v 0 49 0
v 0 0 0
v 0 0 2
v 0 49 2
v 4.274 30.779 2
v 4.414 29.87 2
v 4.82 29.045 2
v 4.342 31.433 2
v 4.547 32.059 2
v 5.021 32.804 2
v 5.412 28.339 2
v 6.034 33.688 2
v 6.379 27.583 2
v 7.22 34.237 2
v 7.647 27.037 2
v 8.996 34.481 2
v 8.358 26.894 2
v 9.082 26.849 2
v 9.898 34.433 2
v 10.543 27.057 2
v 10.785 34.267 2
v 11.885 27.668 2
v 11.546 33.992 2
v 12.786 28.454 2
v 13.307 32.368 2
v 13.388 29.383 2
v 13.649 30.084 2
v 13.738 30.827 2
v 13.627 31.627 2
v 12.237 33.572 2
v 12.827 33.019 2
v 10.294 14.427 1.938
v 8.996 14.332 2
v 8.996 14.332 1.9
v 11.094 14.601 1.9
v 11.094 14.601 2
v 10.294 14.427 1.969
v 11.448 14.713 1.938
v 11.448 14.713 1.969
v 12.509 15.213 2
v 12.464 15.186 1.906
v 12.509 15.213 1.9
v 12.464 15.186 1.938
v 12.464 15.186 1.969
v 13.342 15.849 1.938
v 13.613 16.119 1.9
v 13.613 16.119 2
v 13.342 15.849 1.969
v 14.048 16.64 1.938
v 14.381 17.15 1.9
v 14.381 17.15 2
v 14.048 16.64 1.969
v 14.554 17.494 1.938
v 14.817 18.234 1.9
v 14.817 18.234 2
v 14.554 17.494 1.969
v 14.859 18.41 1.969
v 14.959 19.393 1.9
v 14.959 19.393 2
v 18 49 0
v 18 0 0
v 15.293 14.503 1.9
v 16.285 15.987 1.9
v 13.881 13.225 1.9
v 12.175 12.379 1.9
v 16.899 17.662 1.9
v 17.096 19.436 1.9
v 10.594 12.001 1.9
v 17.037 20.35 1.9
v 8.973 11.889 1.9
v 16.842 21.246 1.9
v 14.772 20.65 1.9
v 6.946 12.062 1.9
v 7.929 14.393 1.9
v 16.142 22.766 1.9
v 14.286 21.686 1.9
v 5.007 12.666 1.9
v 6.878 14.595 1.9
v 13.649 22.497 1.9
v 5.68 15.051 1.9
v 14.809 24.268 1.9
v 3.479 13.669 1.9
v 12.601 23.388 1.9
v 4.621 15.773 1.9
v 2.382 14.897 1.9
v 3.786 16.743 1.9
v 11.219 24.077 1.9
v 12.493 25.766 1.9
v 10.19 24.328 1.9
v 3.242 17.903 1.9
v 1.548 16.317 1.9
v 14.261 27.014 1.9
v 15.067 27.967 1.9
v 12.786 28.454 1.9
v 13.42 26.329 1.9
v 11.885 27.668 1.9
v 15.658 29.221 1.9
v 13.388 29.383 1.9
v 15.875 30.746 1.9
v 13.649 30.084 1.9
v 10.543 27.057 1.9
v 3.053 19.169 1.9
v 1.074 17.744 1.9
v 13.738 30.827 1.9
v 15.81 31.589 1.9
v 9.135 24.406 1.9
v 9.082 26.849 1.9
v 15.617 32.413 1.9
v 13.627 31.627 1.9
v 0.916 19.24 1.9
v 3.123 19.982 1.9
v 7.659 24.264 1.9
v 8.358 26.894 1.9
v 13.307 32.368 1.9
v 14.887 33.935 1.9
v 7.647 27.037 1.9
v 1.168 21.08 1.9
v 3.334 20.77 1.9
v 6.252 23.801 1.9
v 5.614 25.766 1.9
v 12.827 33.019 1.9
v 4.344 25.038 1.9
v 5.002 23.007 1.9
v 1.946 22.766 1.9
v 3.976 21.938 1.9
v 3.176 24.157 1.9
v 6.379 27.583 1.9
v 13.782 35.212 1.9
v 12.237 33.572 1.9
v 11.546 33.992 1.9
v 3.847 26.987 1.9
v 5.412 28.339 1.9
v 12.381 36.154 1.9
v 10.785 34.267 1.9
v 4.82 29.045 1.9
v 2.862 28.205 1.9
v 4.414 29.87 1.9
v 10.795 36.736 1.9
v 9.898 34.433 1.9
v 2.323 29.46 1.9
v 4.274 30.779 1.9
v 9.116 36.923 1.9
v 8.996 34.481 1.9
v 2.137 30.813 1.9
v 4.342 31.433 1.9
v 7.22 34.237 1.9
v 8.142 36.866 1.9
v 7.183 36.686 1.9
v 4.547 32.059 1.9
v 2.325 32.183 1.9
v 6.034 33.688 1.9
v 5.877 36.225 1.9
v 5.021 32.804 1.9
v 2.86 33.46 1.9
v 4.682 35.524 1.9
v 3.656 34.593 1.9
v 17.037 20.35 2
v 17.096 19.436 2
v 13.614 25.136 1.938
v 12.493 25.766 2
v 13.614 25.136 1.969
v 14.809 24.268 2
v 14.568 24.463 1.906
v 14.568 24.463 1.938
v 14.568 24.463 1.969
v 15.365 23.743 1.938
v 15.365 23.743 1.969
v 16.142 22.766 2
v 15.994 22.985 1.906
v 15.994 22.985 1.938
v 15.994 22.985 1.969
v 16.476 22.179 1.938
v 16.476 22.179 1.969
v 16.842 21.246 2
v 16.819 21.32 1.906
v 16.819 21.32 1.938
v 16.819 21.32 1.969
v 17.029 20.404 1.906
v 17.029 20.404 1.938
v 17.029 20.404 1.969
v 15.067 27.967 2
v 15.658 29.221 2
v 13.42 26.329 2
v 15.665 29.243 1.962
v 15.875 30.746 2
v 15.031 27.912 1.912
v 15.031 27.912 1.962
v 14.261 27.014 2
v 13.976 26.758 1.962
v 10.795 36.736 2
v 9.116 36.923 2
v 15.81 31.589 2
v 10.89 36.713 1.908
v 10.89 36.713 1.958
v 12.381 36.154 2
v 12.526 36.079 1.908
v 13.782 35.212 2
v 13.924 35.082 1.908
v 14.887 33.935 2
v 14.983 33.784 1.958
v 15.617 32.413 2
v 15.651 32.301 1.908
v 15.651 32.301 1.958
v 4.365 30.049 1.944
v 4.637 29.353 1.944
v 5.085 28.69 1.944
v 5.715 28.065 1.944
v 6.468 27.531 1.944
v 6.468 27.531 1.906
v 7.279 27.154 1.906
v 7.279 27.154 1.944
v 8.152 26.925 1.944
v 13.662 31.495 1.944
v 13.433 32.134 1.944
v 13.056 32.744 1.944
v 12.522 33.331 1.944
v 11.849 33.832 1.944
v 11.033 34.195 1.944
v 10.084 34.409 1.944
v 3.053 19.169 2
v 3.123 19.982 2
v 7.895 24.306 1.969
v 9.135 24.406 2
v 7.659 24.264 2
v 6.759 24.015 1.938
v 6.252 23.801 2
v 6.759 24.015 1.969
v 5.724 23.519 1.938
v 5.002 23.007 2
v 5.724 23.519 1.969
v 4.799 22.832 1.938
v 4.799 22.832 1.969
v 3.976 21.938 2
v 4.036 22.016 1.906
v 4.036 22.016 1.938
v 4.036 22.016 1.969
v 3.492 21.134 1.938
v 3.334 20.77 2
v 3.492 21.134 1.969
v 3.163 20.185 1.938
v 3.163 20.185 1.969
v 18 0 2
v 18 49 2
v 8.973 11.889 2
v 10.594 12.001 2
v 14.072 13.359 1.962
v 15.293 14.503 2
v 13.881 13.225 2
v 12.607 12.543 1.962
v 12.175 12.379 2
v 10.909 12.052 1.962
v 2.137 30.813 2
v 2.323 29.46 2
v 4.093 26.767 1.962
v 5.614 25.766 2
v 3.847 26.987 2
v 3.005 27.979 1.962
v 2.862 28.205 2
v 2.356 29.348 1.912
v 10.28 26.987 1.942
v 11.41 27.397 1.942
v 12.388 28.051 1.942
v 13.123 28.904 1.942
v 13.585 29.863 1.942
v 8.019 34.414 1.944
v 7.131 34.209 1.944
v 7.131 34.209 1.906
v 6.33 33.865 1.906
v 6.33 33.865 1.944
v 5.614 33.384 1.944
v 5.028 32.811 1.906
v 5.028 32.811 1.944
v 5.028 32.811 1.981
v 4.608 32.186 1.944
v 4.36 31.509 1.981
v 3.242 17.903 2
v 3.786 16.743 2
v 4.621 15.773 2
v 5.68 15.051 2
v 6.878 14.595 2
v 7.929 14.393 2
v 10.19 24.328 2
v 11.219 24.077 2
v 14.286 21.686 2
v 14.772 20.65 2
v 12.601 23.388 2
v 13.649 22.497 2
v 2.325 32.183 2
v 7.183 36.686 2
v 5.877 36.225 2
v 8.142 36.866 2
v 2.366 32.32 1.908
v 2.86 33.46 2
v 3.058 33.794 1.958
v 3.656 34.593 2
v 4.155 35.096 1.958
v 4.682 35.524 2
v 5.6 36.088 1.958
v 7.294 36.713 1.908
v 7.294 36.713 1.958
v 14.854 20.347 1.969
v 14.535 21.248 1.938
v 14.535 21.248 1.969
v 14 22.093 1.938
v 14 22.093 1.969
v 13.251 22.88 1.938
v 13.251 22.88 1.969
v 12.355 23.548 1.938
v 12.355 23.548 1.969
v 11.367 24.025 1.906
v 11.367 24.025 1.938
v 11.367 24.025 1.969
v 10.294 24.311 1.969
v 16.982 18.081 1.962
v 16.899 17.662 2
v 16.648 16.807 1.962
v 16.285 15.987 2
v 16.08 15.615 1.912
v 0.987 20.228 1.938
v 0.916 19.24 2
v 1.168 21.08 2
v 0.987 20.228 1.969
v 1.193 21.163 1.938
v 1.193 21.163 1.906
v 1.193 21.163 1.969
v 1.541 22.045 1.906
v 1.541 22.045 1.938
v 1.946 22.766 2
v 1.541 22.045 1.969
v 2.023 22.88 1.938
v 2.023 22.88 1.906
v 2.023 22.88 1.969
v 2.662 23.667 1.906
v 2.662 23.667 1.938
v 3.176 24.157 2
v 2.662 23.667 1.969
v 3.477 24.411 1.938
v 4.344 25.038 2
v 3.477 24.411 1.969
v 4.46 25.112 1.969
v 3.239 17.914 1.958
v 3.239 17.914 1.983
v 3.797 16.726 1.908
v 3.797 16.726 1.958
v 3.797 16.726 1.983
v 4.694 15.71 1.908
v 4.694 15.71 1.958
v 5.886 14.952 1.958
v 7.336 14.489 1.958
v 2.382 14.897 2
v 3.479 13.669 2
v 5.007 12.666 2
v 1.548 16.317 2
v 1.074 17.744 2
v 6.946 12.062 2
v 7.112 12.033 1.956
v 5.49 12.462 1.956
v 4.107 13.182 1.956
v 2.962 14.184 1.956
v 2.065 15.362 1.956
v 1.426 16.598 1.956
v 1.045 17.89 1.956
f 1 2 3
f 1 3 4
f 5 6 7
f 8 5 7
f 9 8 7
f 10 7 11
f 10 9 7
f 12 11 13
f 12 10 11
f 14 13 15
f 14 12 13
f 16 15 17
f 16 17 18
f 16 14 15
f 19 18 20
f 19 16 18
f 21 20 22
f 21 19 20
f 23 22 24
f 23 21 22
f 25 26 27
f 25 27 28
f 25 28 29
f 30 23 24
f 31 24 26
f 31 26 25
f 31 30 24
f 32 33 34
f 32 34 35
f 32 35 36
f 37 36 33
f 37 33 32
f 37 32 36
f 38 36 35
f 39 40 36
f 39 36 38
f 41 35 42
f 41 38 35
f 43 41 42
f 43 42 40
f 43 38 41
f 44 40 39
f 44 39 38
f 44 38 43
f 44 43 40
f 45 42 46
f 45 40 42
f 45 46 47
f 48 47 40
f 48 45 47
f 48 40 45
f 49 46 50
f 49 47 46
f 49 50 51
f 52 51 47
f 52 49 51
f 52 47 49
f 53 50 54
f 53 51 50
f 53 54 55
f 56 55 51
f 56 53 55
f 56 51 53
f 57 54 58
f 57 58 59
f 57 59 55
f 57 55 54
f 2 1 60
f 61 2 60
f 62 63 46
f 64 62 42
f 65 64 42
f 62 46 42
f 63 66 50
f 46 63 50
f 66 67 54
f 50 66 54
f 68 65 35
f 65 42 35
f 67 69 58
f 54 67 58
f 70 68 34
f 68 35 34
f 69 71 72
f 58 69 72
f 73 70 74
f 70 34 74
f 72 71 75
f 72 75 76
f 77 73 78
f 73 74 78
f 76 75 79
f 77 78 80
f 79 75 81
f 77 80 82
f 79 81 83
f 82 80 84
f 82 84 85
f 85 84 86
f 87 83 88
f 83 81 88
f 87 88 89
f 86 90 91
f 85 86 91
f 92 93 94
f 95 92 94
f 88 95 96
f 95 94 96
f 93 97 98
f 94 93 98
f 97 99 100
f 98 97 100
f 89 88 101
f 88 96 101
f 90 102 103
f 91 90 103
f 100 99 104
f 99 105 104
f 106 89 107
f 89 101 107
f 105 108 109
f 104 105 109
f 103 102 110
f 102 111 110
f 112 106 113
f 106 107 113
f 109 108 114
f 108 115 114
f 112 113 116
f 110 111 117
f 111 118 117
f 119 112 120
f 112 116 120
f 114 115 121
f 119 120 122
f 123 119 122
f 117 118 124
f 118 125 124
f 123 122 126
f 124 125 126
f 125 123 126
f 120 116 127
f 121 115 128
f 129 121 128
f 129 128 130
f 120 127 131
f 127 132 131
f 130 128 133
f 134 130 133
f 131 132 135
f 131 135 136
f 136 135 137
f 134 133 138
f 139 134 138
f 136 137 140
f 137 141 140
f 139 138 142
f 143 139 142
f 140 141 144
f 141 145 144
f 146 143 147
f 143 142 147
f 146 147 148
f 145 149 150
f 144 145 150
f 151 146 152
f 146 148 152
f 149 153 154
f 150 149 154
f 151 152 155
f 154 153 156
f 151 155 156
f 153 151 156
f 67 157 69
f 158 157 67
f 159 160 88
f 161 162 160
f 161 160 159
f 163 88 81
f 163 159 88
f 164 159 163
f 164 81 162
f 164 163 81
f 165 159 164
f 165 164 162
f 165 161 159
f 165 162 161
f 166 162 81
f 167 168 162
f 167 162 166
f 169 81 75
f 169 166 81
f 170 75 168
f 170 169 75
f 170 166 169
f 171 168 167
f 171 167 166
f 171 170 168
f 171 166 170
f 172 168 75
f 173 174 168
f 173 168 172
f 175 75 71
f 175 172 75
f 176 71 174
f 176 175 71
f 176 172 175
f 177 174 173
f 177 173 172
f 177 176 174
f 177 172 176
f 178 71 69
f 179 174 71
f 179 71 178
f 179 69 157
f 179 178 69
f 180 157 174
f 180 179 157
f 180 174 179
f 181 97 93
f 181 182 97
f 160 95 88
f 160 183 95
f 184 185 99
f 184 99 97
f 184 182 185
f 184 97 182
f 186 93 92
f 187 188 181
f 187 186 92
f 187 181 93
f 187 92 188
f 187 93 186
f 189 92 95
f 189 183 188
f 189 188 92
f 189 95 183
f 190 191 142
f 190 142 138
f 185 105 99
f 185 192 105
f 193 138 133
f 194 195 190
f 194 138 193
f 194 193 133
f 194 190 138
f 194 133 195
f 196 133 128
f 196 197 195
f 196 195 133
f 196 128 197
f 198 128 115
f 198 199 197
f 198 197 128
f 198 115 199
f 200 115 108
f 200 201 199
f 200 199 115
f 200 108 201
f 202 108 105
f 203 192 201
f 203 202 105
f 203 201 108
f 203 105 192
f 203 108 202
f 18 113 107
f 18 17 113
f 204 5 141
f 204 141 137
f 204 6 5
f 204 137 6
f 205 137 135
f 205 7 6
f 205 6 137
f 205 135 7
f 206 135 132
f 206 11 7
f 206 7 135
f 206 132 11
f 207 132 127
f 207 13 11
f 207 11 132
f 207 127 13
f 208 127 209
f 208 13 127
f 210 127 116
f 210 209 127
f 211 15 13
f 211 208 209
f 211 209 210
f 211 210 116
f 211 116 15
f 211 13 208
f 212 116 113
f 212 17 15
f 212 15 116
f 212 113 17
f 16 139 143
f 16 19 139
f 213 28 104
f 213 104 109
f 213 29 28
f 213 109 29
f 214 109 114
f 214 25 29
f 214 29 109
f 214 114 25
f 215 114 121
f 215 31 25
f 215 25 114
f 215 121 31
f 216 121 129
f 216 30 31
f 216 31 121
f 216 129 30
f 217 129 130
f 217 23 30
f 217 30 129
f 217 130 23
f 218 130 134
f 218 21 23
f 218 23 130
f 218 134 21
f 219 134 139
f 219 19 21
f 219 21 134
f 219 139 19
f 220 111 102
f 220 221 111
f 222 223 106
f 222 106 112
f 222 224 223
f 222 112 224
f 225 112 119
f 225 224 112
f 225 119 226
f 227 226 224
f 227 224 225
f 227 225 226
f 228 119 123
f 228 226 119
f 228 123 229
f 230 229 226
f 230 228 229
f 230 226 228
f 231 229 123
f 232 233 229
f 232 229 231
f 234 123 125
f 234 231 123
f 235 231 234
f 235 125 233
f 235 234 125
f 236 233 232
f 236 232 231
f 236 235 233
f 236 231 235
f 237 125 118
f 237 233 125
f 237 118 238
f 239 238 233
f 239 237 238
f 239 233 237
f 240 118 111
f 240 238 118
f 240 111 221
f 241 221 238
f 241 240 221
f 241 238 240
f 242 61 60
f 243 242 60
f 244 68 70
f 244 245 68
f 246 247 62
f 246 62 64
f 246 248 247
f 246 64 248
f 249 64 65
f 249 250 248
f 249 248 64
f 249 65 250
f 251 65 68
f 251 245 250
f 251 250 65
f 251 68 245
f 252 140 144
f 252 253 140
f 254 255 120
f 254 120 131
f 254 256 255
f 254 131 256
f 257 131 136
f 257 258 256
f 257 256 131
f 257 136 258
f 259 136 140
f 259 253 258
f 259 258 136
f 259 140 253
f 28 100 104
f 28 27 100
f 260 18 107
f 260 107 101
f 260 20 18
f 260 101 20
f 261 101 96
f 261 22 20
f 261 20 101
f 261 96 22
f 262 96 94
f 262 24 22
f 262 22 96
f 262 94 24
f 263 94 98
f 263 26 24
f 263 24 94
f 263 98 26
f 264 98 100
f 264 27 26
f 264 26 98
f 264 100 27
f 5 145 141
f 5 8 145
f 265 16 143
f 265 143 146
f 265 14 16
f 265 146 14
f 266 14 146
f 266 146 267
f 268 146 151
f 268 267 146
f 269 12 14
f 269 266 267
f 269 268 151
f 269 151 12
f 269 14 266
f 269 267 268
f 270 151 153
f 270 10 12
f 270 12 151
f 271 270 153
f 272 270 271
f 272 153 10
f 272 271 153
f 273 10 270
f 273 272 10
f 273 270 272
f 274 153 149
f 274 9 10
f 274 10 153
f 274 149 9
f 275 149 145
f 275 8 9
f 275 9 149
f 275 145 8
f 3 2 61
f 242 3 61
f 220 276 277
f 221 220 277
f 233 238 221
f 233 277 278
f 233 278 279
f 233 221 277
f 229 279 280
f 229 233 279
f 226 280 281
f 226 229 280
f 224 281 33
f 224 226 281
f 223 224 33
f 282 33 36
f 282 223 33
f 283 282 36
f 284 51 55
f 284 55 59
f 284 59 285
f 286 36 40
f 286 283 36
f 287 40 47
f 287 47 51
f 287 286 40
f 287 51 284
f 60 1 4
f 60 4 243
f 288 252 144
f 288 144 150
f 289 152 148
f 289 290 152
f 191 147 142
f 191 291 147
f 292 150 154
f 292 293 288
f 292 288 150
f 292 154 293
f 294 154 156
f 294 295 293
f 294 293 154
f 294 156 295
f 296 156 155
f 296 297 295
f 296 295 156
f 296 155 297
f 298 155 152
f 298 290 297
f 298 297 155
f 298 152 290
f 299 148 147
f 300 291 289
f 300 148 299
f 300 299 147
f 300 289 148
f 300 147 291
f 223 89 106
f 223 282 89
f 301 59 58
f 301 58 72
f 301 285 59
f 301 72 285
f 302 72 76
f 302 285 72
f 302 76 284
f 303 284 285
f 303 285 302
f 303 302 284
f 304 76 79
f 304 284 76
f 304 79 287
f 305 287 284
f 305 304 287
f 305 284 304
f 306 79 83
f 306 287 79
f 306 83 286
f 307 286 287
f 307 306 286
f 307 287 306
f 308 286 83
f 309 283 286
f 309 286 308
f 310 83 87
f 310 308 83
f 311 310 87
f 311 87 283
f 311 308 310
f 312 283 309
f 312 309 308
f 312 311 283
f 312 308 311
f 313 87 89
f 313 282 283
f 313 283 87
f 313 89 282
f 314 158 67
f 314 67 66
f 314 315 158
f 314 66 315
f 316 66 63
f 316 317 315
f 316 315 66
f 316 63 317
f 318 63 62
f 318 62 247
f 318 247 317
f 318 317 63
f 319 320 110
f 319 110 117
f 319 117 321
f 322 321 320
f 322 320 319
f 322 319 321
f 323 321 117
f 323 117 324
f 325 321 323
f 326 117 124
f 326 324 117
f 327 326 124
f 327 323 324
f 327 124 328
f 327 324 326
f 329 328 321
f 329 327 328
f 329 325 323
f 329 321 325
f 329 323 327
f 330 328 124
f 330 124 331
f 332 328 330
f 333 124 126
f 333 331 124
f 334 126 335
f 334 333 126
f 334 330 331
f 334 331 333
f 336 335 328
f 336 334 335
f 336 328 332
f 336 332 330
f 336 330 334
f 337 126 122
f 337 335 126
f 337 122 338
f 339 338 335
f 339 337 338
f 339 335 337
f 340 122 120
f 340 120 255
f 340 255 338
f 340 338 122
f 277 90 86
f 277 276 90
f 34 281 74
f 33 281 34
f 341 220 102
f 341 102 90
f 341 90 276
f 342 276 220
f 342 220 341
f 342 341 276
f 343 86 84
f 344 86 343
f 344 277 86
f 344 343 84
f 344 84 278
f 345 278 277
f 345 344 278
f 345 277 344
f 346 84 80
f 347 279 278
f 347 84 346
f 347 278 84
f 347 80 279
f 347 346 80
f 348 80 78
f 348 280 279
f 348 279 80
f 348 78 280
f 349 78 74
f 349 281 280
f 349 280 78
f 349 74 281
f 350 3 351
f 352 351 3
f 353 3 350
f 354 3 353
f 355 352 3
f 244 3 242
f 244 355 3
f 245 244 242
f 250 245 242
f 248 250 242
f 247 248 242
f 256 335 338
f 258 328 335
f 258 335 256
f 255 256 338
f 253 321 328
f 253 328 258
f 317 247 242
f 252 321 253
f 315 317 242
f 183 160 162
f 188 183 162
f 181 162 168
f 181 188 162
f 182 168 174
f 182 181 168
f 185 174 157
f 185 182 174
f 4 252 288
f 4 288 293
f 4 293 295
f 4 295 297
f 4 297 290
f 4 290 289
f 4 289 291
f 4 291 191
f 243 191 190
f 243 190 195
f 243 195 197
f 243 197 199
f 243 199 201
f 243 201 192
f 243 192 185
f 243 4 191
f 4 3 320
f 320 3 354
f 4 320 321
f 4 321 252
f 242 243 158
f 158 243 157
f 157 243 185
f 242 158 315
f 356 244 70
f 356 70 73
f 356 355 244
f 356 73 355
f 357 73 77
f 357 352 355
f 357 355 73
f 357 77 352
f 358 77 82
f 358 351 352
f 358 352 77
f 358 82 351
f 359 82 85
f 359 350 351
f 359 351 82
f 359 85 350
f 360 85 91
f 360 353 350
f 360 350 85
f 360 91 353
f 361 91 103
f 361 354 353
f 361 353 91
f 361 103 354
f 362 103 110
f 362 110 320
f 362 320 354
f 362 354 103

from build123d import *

# Parameters (mm, degrees)
SKETCH_1_W          = 18
SKETCH_1_H          = 49
EXTRUDE_1_DEPTH     = 2
CUT_EXTRUDE_1_DEPTH = 0.1


with BuildPart() as part:
    # ｽｹｯﾁ1 → ﾎﾞｽ - 押し出し1 (new body)
    with BuildSketch(Plane.XY):
        with Locations((9, 24.5)):
            Rectangle(SKETCH_1_W, SKETCH_1_H)
    extrude(amount=EXTRUDE_1_DEPTH)

    # ｽｹｯﾁ2 → ｶｯﾄ - 押し出し1 (cut)
    with BuildSketch(Plane.XY.offset(2)):
        with BuildLine():
            add(Edge.make_bspline(
                [(12.492976262, 25.76573768), (12.687888699, 25.66410623), (13.068033045, 25.46589096), (13.609442265, 25.146729793), (14.104232006, 24.810354657), (14.566130292, 24.472653542), (14.987022018, 24.120693557), (15.36220097, 23.753075119), (15.700934598, 23.378974313), (15.996391825, 22.992056293), (16.256266732, 22.593348984), (16.480867152, 22.181805894), (16.672844907, 21.758328927), (16.824992758, 21.318295495), (16.950326734, 20.868169429), (17.036566118, 20.402138517), (17.082945505, 19.923273626), (17.09171404, 19.599639288), (17.096153846, 19.435772236)],
                knots=[0, 0, 0, 0, 1.272397273, 2.481599622, 3.635517121, 4.734568067, 5.792894095, 6.808321871, 7.773003508, 8.711915296, 9.623354172, 10.525449501, 11.423591555, 12.311487226, 13.218079475, 14.126165749, 15.051214107, 16, 16, 16, 16], degree=3))
            add(Edge.make_bspline(
                [(17.096153846, 19.435772236), (17.090905431, 19.206507305), (17.080516849, 18.752705983), (16.990029458, 18.082920831), (16.854550087, 17.432419243), (16.656705548, 16.801343833), (16.400119799, 16.193176846), (16.083911326, 15.607397691), (15.725967234, 15.034405605), (15.438501106, 14.681848605), (15.29304387, 14.503455529)],
                knots=[0, 0, 0, 0, 1.025265484, 2.029385089, 3.018602448, 3.995076438, 4.983346944, 5.966715145, 6.97116228, 8, 8, 8, 8], degree=3))
            add(Edge.make_bspline(
                [(15.29304387, 14.503455529), (15.103656429, 14.295308601), (14.72722186, 13.881586874), (14.082359441, 13.344439399), (13.374639125, 12.893026557), (12.606799397, 12.52514456), (11.780892761, 12.238810413), (10.897095194, 12.033053282), (9.953683725, 11.915198898), (9.305266145, 11.898162825), (8.97261869, 11.889423077)],
                knots=[0, 0, 0, 0, 0.954267603, 1.896743057, 2.838368354, 3.796610408, 4.779680527, 5.799409237, 6.871065594, 8, 8, 8, 8], degree=3))
            add(Edge.make_bspline(
                [(8.97261869, 11.889423077), (8.652759742, 11.897264043), (8.030346719, 11.912521767), (7.124397588, 12.015898167), (6.279917417, 12.19706276), (5.491996025, 12.445016263), (4.765383486, 12.767575138), (4.102150245, 13.169043061), (3.492727326, 13.633260552), (2.955609354, 14.173559905), (2.47875762, 14.752257215), (2.059874973, 15.34928156), (1.711708475, 15.964687439), (1.416929487, 16.589298616), (1.191268475, 17.231869772), (1.034975402, 17.889094861), (0.935715961, 18.559825922), (0.922509311, 19.012478778), (0.915865385, 19.240196815)],
                knots=[0, 0, 0, 0, 1.256902934, 2.445805442, 3.576955095, 4.645999104, 5.686449165, 6.692658513, 7.68621702, 8.689161843, 9.678783111, 10.630372946, 11.551080876, 12.453998257, 13.34127905, 14.221779781, 15.105423033, 16, 16, 16, 16], degree=3))
            add(Edge.make_bspline(
                [(0.915865385, 19.240196815), (0.919797039, 19.407287032), (0.927567377, 19.737516278), (0.981348577, 20.225395815), (1.067811501, 20.700258803), (1.185237448, 21.16385922), (1.344379967, 21.612821949), (1.536527338, 22.049274279), (1.760582229, 22.473708952), (2.019670155, 22.888447054), (2.32108214, 23.287677306), (2.662374114, 23.678175055), (3.050367292, 24.053880973), (3.480745293, 24.419385328), (3.948589749, 24.781171864), (4.46605259, 25.119688518), (5.019416091, 25.458900743), (5.412699297, 25.661703814), (5.614445613, 25.76573768)],
                knots=[0, 0, 0, 0, 0.941657376, 1.861047343, 2.762797495, 3.66048619, 4.553285746, 5.444104102, 6.34607688, 7.256116206, 8.197091036, 9.162375105, 10.176350973, 11.237807142, 12.343728897, 13.50695164, 14.721116704, 16, 16, 16, 16], degree=3))
            add(Edge.make_bspline(
                [(5.614445613, 25.76573768), (5.338279296, 25.91633316), (4.803544008, 26.207928159), (4.095500131, 26.743687679), (3.48732464, 27.323949419), (2.995734507, 27.960966416), (2.608800241, 28.6348389), (2.343334378, 29.341350689), (2.163744014, 30.06740139), (2.145953851, 30.563423906), (2.137019231, 30.81253756)],
                knots=[0, 0, 0, 0, 1.166880483, 2.259407225, 3.286803203, 4.280235371, 5.237608625, 6.161067461, 7.076446754, 8, 8, 8, 8], degree=3))
            add(Edge.make_bspline(
                [(2.137019231, 30.81253756), (2.148145955, 31.066294163), (2.170512612, 31.576389188), (2.351374133, 32.33570942), (2.6461053, 33.08149355), (3.046978512, 33.810126882), (3.546273679, 34.496948878), (4.145304642, 35.112950673), (4.829766358, 35.652552009), (5.596242203, 36.105507756), (6.421081593, 36.474150149), (7.291365357, 36.728456918), (8.191930248, 36.894709784), (8.804916517, 36.913532916), (9.115722656, 36.923076923)],
                knots=[0, 0, 0, 0, 0.888701115, 1.786444228, 2.72001202, 3.692817113, 4.693886446, 5.687152267, 6.695133018, 7.739871481, 8.800368666, 9.853104506, 10.91144658, 12, 12, 12, 12], degree=3))
            add(Edge.make_bspline(
                [(9.115722656, 36.923076923), (9.41850754, 36.913236624), (10.015564838, 36.893832676), (10.893189, 36.731996953), (11.73291897, 36.461694327), (12.531858954, 36.095000718), (13.275706124, 35.643332425), (13.932946835, 35.096319335), (14.513513151, 34.483034856), (14.993739119, 33.796421126), (15.389454492, 33.070587595), (15.665005266, 32.311155801), (15.841571374, 31.534534525), (15.863841941, 31.009040249), (15.875, 30.745755709)],
                knots=[0, 0, 0, 0, 1.072916533, 2.115669174, 3.151510826, 4.193348718, 5.225979165, 6.227137561, 7.216255879, 8.211077061, 9.189680878, 10.138522389, 11.067357538, 12, 12, 12, 12], degree=3))
            add(Edge.make_bspline(
                [(15.875, 30.745755709), (15.865239864, 30.487378764), (15.846071512, 29.979941129), (15.684827281, 29.240212481), (15.413274201, 28.547458966), (15.042519271, 27.893819773), (14.559292293, 27.291149227), (13.970043592, 26.731783602), (13.279471034, 26.211127859), (12.760624648, 25.917306345), (12.492976262, 25.76573768)],
                knots=[0, 0, 0, 0, 0.975232327, 1.915300861, 2.843280834, 3.77672583, 4.742871857, 5.749627742, 6.839139064, 8, 8, 8, 8], degree=3))
        make_face()
        with BuildLine():
            add(Edge.make_bspline(
                [(8.996469351, 34.480769231), (8.82943619, 34.476337108), (8.502646291, 34.467665939), (8.023479796, 34.422363427), (7.567828511, 34.334235291), (7.130931725, 34.216950486), (6.718779449, 34.058508995), (6.325774176, 33.872125093), (5.958604545, 33.645524897), (5.61283818, 33.391335318), (5.301569518, 33.111756797), (5.02531355, 32.820470603), (4.795841916, 32.511755882), (4.600980082, 32.193291863), (4.459591543, 31.855626693), (4.35369869, 31.509112796), (4.282115652, 31.149371344), (4.276751784, 30.903514013), (4.274038462, 30.779146635)],
                knots=[0, 0, 0, 0, 1.203892937, 2.355340988, 3.463153438, 4.544400666, 5.610487187, 6.640501085, 7.674077295, 8.714426146, 9.728707835, 10.68524104, 11.601827946, 12.495867327, 13.368432065, 14.231010473, 15.105153427, 16, 16, 16, 16], degree=3))
            add(Edge.make_bspline(
                [(4.274038462, 30.779146635), (4.278715011, 30.654773882), (4.287956546, 30.408995457), (4.359428935, 30.046053047), (4.465951465, 29.689398697), (4.633664, 29.347513034), (4.834820831, 29.008536251), (5.083093195, 28.6809403), (5.378973903, 28.363585092), (5.712535595, 28.059169894), (6.075924807, 27.774108667), (6.460898387, 27.526641128), (6.862624729, 27.319580484), (7.276976307, 27.147250069), (7.7081761, 27.013288174), (8.153581929, 26.91825149), (8.61326865, 26.859182905), (8.924740101, 26.852127456), (9.082331731, 26.848557692)],
                knots=[0, 0, 0, 0, 0.873023192, 1.725219244, 2.590779336, 3.480155217, 4.391973325, 5.357036234, 6.360879153, 7.436073238, 8.526419356, 9.601555421, 10.645666583, 11.697338044, 12.750135903, 13.812665442, 14.89329948, 16, 16, 16, 16], degree=3))
            add(Edge.make_bspline(
                [(9.082331731, 26.848557692), (9.284738687, 26.854496306), (9.687553438, 26.866314879), (10.281364605, 26.976200543), (10.858733668, 27.149051519), (11.413489428, 27.385543433), (11.93127241, 27.682368693), (12.39282716, 28.037739763), (12.794216734, 28.443450996), (13.131269815, 28.89318636), (13.392593948, 29.371828416), (13.596033034, 29.852162551), (13.714831659, 30.339313444), (13.730327249, 30.665660109), (13.737980769, 30.826847957)],
                knots=[0, 0, 0, 0, 1.076279235, 2.141928126, 3.20205304, 4.278698113, 5.344010996, 6.36967002, 7.368914609, 8.37248503, 9.349703398, 10.264243087, 11.142681841, 12, 12, 12, 12], degree=3))
            add(Edge.make_bspline(
                [(13.737980769, 30.826847957), (13.734361966, 30.939977987), (13.72717916, 31.164524881), (13.667987708, 31.496119831), (13.570180702, 31.820171105), (13.437762246, 32.139355697), (13.263524178, 32.44919532), (13.05693926, 32.754560615), (12.80599292, 33.048582151), (12.524349328, 33.338111865), (12.204952888, 33.606063883), (11.848419127, 33.841703608), (11.456575933, 34.041812677), (11.029414041, 34.204341527), (10.568506611, 34.326413584), (10.075976518, 34.417828736), (9.547716978, 34.46935294), (9.18420385, 34.476881266), (8.996469351, 34.480769231)],
                knots=[0, 0, 0, 0, 0.814439003, 1.616544685, 2.417341072, 3.248991801, 4.09997495, 4.973547432, 5.9003056, 6.880240646, 7.880314356, 8.896779544, 9.951930927, 11.043077905, 12.18215768, 13.381699519, 14.647792085, 16, 16, 16, 16], degree=3))
        make_face(mode=Mode.SUBTRACT)
        with BuildLine():
            add(Edge.make_bspline(
                [(9.134803185, 24.40625), (8.92303668, 24.402483261), (8.507602468, 24.395093839), (7.898975868, 24.31284206), (7.314867724, 24.198342082), (6.757247442, 24.024641199), (6.226350498, 23.798786506), (5.719302889, 23.527089011), (5.239983597, 23.205923406), (4.795011477, 22.839370005), (4.388679539, 22.444358362), (4.032183962, 22.026196336), (3.729441903, 21.592655532), (3.485647821, 21.138229829), (3.285543001, 20.67254162), (3.154139658, 20.183993516), (3.069899799, 19.681977621), (3.058587967, 19.340709809), (3.052884615, 19.168644832)],
                knots=[0, 0, 0, 0, 1.140299081, 2.23698856, 3.303958914, 4.344563908, 5.37730929, 6.408454204, 7.439741482, 8.480804886, 9.510774543, 10.48932336, 11.43758569, 12.353841022, 13.263987381, 14.161954604, 15.073269652, 16, 16, 16, 16], degree=3))
            add(Edge.make_bspline(
                [(3.052884615, 19.168644832), (3.062159644, 18.954802417), (3.080561084, 18.530544062), (3.226542858, 17.903506024), (3.460827484, 17.296484204), (3.787570471, 16.714425383), (4.192162348, 16.170479124), (4.689683497, 15.696346561), (5.249214911, 15.275059359), (5.889688525, 14.934332873), (6.589289338, 14.662225019), (7.34783128, 14.474746059), (8.154428137, 14.350639052), (8.71136572, 14.338132855), (8.996469351, 14.331730769)],
                knots=[0, 0, 0, 0, 0.898778495, 1.783155532, 2.693654817, 3.627872908, 4.583023416, 5.533784346, 6.509005473, 7.520592997, 8.575161974, 9.658835044, 10.801527049, 12, 12, 12, 12], degree=3))
            add(Edge.make_bspline(
                [(8.996469351, 14.331730769), (9.219288818, 14.336008912), (9.653412594, 14.344344107), (10.286729496, 14.41791993), (10.884386157, 14.534598627), (11.445223589, 14.704303823), (11.975520071, 14.911472413), (12.466284497, 15.177982468), (12.930141976, 15.48109738), (13.344235383, 15.840721623), (13.721379178, 16.2249839), (14.050218186, 16.631769729), (14.335679382, 17.050023585), (14.559727492, 17.489197418), (14.73884004, 17.940865533), (14.867587796, 18.409192851), (14.947027761, 18.895615775), (14.955062069, 19.22558267), (14.959134615, 19.392841046)],
                knots=[0, 0, 0, 0, 1.224942928, 2.386581632, 3.501229538, 4.569074225, 5.605009692, 6.626002462, 7.634866581, 8.645888296, 9.63523824, 10.59253846, 11.518950513, 12.414518923, 13.29783783, 14.186679152, 15.080837789, 16, 16, 16, 16], degree=3))
            add(Edge.make_bspline(
                [(14.959134615, 19.392841046), (14.95297161, 19.555292238), (14.940819241, 19.875617611), (14.863689251, 20.350279159), (14.728190158, 20.80885902), (14.542266262, 21.256874239), (14.294745784, 21.685247171), (14.00324765, 22.105137551), (13.651543022, 22.504891219), (13.254128751, 22.887613176), (12.821020465, 23.241505956), (12.360642212, 23.554568476), (11.876537747, 23.818221267), (11.369731473, 24.032645994), (10.841348726, 24.201289314), (10.291778143, 24.319099924), (9.720376286, 24.393256151), (9.332199398, 24.401869784), (9.134803185, 24.40625)],
                knots=[0, 0, 0, 0, 0.917430815, 1.809013306, 2.70690318, 3.612392954, 4.541220862, 5.495268465, 6.494511384, 7.542276156, 8.608045339, 9.649016899, 10.681629292, 11.715607085, 12.752076957, 13.808767841, 14.885711793, 16, 16, 16, 16], degree=3))
        make_face(mode=Mode.SUBTRACT)
    extrude(amount=-CUT_EXTRUDE_1_DEPTH, mode=Mode.SUBTRACT)


solid = part.part
